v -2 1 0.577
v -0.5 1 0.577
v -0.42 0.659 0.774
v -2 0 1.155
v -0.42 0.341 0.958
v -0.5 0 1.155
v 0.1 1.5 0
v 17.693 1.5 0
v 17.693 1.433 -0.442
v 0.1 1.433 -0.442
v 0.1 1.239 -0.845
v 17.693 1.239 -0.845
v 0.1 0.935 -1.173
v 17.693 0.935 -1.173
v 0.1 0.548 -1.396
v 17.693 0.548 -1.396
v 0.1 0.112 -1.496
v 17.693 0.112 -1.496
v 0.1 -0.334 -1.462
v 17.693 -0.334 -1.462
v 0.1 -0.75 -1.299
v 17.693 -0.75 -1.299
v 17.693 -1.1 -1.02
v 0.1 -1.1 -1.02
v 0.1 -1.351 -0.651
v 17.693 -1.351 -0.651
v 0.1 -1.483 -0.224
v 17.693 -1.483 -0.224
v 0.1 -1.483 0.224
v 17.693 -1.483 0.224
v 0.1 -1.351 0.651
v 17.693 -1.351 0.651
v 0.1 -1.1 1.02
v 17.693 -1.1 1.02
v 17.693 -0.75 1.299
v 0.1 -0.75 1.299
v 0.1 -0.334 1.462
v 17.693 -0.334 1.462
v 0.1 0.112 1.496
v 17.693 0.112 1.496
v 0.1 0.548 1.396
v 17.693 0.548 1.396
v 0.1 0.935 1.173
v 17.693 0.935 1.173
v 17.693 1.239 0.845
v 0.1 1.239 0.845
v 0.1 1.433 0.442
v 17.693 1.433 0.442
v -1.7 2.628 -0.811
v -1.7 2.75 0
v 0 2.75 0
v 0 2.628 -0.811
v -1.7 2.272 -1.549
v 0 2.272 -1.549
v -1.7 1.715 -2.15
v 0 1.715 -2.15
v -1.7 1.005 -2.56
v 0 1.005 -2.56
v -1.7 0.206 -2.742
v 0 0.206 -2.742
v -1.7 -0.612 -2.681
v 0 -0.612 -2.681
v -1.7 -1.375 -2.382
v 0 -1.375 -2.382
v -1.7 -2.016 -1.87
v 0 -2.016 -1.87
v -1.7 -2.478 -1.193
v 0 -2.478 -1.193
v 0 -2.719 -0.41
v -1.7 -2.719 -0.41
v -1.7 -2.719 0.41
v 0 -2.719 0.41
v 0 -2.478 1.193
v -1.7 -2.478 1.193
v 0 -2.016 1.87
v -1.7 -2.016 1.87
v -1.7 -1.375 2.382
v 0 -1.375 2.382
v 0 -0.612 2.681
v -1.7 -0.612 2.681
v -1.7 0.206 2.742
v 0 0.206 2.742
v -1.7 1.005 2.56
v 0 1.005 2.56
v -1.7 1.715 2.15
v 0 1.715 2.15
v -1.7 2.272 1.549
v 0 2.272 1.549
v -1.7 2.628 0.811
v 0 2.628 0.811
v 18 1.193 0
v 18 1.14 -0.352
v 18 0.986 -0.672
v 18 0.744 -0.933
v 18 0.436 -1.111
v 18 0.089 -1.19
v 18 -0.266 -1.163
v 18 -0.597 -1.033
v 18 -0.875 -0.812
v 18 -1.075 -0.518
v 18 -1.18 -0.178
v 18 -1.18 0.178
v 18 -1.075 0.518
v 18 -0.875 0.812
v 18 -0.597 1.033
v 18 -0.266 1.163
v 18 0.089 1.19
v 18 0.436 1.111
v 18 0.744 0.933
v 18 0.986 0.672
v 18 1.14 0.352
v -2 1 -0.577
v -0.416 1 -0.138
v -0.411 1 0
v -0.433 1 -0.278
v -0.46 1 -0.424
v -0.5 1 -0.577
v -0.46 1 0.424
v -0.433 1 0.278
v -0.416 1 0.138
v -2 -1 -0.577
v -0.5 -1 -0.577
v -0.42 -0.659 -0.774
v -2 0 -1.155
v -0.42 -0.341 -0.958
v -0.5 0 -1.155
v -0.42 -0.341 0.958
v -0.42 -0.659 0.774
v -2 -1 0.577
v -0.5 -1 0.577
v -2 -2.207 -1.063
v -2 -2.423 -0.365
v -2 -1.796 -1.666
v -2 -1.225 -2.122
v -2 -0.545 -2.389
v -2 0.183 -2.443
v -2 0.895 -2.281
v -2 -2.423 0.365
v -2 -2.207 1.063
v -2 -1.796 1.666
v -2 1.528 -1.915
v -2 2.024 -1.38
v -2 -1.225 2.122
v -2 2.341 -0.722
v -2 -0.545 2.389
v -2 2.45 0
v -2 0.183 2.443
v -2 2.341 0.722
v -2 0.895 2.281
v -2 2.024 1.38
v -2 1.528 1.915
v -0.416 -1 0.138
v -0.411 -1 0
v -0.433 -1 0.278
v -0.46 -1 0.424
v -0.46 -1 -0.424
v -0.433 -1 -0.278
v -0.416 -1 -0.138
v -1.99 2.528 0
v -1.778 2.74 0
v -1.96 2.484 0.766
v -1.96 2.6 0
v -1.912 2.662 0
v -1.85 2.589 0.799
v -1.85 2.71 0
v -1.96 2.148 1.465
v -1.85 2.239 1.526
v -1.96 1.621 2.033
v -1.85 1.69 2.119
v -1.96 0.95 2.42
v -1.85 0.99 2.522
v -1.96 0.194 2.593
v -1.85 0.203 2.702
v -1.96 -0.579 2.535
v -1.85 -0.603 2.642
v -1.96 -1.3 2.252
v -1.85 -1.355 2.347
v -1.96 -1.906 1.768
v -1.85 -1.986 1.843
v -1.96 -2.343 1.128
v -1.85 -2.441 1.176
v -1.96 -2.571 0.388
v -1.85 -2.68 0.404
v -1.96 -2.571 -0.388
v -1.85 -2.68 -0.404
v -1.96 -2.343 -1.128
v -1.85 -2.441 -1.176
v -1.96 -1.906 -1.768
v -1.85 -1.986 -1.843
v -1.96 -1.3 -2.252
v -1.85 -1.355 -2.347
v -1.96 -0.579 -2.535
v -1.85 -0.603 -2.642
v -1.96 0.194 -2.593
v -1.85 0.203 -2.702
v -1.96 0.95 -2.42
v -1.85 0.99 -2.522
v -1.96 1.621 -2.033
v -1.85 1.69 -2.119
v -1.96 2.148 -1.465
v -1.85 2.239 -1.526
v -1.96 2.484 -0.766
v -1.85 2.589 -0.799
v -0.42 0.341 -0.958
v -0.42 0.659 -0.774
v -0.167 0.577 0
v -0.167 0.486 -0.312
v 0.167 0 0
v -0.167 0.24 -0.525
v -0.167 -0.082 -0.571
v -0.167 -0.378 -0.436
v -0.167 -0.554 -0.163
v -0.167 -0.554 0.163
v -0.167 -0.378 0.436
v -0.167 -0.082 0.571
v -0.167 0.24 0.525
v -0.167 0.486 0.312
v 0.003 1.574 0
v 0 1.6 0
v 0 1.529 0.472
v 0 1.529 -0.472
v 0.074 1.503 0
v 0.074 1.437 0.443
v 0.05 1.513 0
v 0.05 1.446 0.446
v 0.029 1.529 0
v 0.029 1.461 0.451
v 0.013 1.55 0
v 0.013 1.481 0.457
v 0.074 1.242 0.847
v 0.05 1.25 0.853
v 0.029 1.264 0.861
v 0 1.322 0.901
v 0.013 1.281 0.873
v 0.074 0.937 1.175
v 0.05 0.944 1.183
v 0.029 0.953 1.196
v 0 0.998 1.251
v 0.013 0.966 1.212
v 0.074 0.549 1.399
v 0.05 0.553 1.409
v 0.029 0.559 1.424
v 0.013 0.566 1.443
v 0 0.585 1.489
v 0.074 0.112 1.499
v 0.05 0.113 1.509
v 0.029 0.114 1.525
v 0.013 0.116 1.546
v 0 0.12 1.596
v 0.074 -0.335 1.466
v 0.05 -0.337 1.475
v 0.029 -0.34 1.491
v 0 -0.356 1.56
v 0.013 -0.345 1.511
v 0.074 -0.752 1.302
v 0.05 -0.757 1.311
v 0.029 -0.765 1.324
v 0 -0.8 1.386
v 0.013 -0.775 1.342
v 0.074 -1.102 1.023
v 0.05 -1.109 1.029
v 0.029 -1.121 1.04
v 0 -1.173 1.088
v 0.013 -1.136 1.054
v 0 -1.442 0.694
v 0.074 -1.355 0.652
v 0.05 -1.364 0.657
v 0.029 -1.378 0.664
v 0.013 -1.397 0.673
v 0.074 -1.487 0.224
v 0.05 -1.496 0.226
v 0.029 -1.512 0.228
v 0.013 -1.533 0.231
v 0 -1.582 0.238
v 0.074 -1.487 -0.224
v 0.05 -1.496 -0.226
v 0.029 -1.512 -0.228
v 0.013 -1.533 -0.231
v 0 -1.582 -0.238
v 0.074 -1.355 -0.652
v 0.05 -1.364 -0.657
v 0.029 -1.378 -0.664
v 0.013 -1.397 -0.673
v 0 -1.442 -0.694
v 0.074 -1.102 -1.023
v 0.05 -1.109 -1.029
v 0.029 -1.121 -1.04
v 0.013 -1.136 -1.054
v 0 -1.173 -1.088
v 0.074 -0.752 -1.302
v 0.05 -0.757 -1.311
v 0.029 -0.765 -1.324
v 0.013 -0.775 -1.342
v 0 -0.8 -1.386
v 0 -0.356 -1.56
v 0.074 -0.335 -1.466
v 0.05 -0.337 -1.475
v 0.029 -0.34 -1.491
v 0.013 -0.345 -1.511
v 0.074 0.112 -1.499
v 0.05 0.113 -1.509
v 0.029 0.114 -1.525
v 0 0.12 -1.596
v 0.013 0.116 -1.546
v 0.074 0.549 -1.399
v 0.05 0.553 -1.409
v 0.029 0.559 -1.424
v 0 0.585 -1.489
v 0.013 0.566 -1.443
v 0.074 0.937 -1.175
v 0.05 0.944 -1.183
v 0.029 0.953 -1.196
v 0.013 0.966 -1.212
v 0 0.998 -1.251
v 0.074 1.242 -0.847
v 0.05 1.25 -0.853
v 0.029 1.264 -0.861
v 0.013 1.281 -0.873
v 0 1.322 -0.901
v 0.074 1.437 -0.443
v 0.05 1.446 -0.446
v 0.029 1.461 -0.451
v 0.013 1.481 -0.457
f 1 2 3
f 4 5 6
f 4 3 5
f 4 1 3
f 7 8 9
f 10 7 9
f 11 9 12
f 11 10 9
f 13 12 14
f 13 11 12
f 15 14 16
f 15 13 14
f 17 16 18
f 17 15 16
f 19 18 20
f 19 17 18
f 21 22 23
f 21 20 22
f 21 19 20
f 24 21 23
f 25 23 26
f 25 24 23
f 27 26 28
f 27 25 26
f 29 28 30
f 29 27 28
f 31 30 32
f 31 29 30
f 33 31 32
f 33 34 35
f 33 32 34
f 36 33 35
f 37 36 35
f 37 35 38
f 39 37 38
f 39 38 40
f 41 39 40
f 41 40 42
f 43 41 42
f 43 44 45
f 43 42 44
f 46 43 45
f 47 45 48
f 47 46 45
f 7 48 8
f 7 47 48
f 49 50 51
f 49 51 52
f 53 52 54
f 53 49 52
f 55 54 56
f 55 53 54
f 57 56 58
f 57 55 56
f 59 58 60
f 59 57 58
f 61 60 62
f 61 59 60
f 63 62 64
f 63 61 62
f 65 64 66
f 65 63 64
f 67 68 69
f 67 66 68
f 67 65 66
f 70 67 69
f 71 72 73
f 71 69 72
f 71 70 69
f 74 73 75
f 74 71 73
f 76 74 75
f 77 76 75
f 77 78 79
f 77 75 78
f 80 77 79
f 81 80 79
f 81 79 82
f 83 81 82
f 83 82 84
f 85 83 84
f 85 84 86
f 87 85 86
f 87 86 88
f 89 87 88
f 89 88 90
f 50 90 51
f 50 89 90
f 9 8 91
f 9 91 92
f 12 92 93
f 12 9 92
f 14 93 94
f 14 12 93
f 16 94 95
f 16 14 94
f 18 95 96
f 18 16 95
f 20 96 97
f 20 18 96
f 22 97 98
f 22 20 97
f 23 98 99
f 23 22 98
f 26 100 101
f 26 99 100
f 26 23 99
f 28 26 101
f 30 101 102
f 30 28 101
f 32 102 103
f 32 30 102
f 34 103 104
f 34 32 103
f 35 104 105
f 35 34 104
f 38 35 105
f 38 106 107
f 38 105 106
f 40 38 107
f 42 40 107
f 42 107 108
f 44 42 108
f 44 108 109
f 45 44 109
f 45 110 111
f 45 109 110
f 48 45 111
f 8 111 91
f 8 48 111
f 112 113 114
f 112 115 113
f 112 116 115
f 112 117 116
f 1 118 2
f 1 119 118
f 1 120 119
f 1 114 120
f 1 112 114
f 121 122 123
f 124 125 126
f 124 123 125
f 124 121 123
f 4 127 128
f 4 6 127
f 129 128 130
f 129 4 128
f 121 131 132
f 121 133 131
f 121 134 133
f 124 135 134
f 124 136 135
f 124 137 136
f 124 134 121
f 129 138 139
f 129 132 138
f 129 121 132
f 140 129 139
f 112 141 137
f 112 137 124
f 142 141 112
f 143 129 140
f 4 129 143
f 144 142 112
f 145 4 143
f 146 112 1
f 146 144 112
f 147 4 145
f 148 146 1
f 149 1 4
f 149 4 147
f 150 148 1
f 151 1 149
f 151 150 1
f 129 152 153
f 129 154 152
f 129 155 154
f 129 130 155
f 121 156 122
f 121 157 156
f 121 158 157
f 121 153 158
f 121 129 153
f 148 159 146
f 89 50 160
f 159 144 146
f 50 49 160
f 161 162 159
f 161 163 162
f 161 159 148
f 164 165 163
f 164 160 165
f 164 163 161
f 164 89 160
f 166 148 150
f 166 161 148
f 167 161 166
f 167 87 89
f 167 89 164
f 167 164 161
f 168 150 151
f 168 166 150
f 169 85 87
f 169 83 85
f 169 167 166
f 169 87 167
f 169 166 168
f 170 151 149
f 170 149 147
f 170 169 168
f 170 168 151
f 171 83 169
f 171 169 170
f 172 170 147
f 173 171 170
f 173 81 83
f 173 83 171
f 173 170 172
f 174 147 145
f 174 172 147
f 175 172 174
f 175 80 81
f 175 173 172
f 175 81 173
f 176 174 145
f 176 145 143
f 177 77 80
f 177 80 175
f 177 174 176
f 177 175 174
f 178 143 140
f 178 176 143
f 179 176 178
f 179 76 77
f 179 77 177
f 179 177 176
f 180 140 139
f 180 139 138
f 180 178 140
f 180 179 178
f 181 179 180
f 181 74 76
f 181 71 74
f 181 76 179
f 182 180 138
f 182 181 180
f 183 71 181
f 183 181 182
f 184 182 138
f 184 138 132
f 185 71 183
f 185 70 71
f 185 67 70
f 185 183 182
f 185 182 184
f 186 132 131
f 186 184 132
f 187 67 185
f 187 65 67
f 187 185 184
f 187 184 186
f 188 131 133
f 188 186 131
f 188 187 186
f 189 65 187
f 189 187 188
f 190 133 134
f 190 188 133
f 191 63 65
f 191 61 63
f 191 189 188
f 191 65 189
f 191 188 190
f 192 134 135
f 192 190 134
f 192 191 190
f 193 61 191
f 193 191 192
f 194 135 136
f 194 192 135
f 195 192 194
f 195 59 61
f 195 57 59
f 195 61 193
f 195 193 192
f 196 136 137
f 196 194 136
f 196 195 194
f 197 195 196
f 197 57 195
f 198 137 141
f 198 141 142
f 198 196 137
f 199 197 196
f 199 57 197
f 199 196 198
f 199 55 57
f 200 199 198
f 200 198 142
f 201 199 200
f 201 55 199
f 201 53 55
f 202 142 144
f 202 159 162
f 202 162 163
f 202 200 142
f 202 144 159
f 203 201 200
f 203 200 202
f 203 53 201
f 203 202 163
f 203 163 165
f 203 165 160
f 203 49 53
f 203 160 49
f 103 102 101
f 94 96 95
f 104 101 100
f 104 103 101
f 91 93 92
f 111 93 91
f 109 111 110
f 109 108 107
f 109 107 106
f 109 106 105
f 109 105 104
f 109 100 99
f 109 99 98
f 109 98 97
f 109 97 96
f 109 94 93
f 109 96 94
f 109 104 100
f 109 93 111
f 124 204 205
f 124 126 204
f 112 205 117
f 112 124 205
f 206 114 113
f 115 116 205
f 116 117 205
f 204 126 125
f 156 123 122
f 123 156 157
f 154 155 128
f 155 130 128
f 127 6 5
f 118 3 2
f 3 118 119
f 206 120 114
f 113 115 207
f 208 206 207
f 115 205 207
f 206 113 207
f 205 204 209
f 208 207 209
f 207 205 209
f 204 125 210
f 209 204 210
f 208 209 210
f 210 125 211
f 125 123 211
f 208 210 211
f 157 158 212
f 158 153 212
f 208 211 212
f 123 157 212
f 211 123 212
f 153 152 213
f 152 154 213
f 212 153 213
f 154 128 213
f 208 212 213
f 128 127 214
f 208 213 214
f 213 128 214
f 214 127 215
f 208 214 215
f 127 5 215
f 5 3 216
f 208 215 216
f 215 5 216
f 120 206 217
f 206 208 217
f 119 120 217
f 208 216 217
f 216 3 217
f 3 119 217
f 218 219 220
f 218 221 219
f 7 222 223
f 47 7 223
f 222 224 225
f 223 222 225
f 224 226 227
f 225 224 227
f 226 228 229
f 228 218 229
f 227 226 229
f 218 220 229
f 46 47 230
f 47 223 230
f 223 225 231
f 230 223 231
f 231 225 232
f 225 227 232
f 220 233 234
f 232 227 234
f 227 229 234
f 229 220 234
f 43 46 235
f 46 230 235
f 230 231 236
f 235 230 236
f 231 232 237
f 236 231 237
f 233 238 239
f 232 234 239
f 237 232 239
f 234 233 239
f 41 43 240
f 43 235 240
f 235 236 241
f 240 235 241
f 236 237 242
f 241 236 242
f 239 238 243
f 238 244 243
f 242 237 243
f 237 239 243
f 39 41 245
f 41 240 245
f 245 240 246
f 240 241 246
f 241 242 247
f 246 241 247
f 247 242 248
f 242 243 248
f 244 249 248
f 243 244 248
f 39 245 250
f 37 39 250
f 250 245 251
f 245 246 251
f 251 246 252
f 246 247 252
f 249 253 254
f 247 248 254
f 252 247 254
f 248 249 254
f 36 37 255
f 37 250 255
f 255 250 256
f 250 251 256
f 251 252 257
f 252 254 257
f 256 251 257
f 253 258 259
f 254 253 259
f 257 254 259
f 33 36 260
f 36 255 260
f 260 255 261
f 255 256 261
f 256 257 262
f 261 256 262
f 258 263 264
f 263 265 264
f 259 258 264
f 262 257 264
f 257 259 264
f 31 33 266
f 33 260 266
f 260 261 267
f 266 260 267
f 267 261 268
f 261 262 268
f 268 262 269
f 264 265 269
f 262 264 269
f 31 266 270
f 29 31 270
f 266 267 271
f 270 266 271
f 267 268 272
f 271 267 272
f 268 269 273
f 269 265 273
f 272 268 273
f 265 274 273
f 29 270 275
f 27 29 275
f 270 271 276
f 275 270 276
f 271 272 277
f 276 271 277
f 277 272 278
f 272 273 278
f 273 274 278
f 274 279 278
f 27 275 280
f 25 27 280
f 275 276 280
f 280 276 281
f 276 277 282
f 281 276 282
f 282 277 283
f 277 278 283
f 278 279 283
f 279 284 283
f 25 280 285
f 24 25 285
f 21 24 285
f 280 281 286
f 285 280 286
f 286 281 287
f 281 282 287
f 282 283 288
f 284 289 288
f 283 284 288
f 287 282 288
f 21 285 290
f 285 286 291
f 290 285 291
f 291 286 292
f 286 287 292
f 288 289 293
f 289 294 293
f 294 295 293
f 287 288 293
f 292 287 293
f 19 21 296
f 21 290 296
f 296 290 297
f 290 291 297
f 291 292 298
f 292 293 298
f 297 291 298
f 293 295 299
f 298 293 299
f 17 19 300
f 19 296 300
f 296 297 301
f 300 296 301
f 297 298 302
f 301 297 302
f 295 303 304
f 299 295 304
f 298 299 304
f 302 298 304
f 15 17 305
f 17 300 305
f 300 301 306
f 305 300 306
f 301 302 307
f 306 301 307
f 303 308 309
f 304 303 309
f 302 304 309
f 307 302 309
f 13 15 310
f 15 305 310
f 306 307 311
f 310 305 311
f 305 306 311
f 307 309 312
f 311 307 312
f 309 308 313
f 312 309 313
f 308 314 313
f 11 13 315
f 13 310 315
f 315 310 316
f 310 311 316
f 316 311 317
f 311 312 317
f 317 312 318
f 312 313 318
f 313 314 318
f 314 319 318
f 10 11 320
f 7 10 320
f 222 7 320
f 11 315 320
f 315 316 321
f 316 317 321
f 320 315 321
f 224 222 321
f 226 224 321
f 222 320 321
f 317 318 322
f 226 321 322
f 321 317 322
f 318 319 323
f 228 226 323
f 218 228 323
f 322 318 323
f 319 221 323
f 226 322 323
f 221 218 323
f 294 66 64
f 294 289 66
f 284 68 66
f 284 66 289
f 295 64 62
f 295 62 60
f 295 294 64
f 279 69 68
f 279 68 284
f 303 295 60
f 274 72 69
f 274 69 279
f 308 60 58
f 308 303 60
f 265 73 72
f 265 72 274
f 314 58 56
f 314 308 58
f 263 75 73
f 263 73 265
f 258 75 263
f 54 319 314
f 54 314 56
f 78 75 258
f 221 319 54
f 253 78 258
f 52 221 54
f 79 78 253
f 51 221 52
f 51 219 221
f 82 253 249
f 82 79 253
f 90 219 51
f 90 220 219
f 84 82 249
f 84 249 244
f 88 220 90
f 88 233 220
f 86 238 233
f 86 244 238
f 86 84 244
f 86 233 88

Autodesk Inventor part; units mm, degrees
ref_plane "YZ Plane" through (0, 0, 0) normal (1, 0, 0) x (0, 1, 0)
ref_plane "XZ Plane" through (0, 0, 0) normal (0, 1, 0) x (-1, 0, 0)
sketch "Szkic1" plane through (0, 0, 0) normal (0, 0, 1) x (1, 0, 0)
  line L0 (0.1667, 0) -> (18, 0)
  line L1 (18, 0) -> (18, 1.5)
  line L2 (18, 1.5) -> (1.5, 1.5)
  line L3 (1.5, 1.5) -> (1.1932, 1.5)
  line L4 (1.1932, 1.5) -> (0, 1.5)
  line L5 (0, 1.5) -> (0, 2.75)
  line L6 (0, 2.75) -> (-2, 2.75)
  line L7 (-2, 2.75) -> (-2, 1.1547)
  line L8 (-2, 1.1547) -> (-0.5, 1.1547)
  line L9 (-0.5, 1.1547) -> (0.1667, 0)
  line L10 (-6, 0) -> (22, 0) projected
  line L11 (0, -0.55) -> (0, 3.3) projected
  line L12 (1.5, 1.5) -> (0, 1.5) construction
  dimension "d1" = 16.5
  dimension "d2" = 0.3068
  dimension "d3" = 2
  dimension "d4" = 1.5
  dimension "d5" = 60
  dimension "d6" = 3
  dimension "d7" = 3
  dimension "d8" = 2.3094
  dimension "d9" = 5.5
  dimension "d26" = 18
revolve "Bryła" add sketch "Szkic1" angle 360 about axis through (0.1667, 0, 0) along (1, 0, 0) contours L9 L11 L4 L3 L2 L1 L0 | L9 L8 L7 L6 L5 L11
sketch "Szkic2" plane through (-2, 0, 0) normal (-1, 0, 0) x (0, 0, 1)
  circle A0 centre (0, 0) radius 1.1547 projected
  line L0 (0, -3.85) -> (0, 3.85) projected
  line L1 (-3.85, 0) -> (3.85, 0) projected
  line L2 (1.1547, 0) -> (0.5774, -1)
  line L3 (0.5774, -1) -> (-0.5774, -1)
  line L4 (-0.5774, -1) -> (-1.1547, 0)
  line L5 (-1.1547, 0) -> (-0.5774, 1)
  line L6 (-0.5774, 1) -> (0.5774, 1)
  line L7 (0.5774, 1) -> (1.1547, 0)
  point P0 (0, 0)
extrude "Szczelina" add sketch "Szkic2" against normal up to next contours L7 A0 | A0 L2 | L6 L0 A0 | A0 L0 L3 | L0 L6 A0 | A0 L3 L0 | L4 A0 | A0 L5
fillet "Zaokrąglenie1" radius 0.3 1 edges at (-2, -2.75, 0)
thread "Gwint" size "M3x0.5" class "6g" standard "ISO Metric profile" length 16.5
chamfer "Faza1" distance 0.3067 distance2 0.3067 1 edges at (18, -1.5, 0) measured on face at (18, -0.4645, -0.4115)
ref_plane "Work Plane1" through (29, 0, 0) normal (0, -1, 0) x (1, 0, 0)
fillet "Fillet2" radius 0.1 1 edges at (0, -1.5, 0)
equation "\"d1\" = GEL"
equation "\"d3\" = KOH"
equation "\"d4\" = INTI"
equation "\"d6\" = GD"
equation "\"d7\" = BDM"
equation "\"d8\" = 1.1547 * SW"
equation "\"d9\" = KOD"
equation "\"d26\" = NLG"
equation "\"d30\" = R"
equation "\"d17\" = RR"
equation "\"d13\" = GEL"
equation "\"d15\" = -0.5 * SPD + 0.5 * GD"
equation "\"d16\" = GUL"
equation "\"GD\" = NND"
equation "\"NLG\" = 18"
equation "\"GEL\" = 16.5"
equation "\"KOD\" = 5.5"
equation "\"KOH\" = 2"
equation "\"INTI\" = 1.5"
equation "\"GAL\" = 0.61345 * PTC"
equation "\"GUL\" = 0.61345 * PTC"
equation "\"BDM\" = NND"
equation "\"SW\" = 2"
equation "\"RR\" = 0.3"
equation "\"SPD\" = NND - 1.2269 * PTC"
equation "\"R\" = 0.1"
equation "\"TOA\" = 30deg"
equation "\"GD1\" = THREADDIA - 1.2269 * PTC"
equation "\"THREADDIA\" = 3"
equation "\"FAWI\" = 45deg"
equation "\"ANG\" = 120deg"
equation "\"PTC\" = 0.5"
equation "\"NND\" = 3"
equation "\"E0\" = 1.155 * SW"
properties part number "DIN 7984 - M3 x 18" material "Stal, miękka"
